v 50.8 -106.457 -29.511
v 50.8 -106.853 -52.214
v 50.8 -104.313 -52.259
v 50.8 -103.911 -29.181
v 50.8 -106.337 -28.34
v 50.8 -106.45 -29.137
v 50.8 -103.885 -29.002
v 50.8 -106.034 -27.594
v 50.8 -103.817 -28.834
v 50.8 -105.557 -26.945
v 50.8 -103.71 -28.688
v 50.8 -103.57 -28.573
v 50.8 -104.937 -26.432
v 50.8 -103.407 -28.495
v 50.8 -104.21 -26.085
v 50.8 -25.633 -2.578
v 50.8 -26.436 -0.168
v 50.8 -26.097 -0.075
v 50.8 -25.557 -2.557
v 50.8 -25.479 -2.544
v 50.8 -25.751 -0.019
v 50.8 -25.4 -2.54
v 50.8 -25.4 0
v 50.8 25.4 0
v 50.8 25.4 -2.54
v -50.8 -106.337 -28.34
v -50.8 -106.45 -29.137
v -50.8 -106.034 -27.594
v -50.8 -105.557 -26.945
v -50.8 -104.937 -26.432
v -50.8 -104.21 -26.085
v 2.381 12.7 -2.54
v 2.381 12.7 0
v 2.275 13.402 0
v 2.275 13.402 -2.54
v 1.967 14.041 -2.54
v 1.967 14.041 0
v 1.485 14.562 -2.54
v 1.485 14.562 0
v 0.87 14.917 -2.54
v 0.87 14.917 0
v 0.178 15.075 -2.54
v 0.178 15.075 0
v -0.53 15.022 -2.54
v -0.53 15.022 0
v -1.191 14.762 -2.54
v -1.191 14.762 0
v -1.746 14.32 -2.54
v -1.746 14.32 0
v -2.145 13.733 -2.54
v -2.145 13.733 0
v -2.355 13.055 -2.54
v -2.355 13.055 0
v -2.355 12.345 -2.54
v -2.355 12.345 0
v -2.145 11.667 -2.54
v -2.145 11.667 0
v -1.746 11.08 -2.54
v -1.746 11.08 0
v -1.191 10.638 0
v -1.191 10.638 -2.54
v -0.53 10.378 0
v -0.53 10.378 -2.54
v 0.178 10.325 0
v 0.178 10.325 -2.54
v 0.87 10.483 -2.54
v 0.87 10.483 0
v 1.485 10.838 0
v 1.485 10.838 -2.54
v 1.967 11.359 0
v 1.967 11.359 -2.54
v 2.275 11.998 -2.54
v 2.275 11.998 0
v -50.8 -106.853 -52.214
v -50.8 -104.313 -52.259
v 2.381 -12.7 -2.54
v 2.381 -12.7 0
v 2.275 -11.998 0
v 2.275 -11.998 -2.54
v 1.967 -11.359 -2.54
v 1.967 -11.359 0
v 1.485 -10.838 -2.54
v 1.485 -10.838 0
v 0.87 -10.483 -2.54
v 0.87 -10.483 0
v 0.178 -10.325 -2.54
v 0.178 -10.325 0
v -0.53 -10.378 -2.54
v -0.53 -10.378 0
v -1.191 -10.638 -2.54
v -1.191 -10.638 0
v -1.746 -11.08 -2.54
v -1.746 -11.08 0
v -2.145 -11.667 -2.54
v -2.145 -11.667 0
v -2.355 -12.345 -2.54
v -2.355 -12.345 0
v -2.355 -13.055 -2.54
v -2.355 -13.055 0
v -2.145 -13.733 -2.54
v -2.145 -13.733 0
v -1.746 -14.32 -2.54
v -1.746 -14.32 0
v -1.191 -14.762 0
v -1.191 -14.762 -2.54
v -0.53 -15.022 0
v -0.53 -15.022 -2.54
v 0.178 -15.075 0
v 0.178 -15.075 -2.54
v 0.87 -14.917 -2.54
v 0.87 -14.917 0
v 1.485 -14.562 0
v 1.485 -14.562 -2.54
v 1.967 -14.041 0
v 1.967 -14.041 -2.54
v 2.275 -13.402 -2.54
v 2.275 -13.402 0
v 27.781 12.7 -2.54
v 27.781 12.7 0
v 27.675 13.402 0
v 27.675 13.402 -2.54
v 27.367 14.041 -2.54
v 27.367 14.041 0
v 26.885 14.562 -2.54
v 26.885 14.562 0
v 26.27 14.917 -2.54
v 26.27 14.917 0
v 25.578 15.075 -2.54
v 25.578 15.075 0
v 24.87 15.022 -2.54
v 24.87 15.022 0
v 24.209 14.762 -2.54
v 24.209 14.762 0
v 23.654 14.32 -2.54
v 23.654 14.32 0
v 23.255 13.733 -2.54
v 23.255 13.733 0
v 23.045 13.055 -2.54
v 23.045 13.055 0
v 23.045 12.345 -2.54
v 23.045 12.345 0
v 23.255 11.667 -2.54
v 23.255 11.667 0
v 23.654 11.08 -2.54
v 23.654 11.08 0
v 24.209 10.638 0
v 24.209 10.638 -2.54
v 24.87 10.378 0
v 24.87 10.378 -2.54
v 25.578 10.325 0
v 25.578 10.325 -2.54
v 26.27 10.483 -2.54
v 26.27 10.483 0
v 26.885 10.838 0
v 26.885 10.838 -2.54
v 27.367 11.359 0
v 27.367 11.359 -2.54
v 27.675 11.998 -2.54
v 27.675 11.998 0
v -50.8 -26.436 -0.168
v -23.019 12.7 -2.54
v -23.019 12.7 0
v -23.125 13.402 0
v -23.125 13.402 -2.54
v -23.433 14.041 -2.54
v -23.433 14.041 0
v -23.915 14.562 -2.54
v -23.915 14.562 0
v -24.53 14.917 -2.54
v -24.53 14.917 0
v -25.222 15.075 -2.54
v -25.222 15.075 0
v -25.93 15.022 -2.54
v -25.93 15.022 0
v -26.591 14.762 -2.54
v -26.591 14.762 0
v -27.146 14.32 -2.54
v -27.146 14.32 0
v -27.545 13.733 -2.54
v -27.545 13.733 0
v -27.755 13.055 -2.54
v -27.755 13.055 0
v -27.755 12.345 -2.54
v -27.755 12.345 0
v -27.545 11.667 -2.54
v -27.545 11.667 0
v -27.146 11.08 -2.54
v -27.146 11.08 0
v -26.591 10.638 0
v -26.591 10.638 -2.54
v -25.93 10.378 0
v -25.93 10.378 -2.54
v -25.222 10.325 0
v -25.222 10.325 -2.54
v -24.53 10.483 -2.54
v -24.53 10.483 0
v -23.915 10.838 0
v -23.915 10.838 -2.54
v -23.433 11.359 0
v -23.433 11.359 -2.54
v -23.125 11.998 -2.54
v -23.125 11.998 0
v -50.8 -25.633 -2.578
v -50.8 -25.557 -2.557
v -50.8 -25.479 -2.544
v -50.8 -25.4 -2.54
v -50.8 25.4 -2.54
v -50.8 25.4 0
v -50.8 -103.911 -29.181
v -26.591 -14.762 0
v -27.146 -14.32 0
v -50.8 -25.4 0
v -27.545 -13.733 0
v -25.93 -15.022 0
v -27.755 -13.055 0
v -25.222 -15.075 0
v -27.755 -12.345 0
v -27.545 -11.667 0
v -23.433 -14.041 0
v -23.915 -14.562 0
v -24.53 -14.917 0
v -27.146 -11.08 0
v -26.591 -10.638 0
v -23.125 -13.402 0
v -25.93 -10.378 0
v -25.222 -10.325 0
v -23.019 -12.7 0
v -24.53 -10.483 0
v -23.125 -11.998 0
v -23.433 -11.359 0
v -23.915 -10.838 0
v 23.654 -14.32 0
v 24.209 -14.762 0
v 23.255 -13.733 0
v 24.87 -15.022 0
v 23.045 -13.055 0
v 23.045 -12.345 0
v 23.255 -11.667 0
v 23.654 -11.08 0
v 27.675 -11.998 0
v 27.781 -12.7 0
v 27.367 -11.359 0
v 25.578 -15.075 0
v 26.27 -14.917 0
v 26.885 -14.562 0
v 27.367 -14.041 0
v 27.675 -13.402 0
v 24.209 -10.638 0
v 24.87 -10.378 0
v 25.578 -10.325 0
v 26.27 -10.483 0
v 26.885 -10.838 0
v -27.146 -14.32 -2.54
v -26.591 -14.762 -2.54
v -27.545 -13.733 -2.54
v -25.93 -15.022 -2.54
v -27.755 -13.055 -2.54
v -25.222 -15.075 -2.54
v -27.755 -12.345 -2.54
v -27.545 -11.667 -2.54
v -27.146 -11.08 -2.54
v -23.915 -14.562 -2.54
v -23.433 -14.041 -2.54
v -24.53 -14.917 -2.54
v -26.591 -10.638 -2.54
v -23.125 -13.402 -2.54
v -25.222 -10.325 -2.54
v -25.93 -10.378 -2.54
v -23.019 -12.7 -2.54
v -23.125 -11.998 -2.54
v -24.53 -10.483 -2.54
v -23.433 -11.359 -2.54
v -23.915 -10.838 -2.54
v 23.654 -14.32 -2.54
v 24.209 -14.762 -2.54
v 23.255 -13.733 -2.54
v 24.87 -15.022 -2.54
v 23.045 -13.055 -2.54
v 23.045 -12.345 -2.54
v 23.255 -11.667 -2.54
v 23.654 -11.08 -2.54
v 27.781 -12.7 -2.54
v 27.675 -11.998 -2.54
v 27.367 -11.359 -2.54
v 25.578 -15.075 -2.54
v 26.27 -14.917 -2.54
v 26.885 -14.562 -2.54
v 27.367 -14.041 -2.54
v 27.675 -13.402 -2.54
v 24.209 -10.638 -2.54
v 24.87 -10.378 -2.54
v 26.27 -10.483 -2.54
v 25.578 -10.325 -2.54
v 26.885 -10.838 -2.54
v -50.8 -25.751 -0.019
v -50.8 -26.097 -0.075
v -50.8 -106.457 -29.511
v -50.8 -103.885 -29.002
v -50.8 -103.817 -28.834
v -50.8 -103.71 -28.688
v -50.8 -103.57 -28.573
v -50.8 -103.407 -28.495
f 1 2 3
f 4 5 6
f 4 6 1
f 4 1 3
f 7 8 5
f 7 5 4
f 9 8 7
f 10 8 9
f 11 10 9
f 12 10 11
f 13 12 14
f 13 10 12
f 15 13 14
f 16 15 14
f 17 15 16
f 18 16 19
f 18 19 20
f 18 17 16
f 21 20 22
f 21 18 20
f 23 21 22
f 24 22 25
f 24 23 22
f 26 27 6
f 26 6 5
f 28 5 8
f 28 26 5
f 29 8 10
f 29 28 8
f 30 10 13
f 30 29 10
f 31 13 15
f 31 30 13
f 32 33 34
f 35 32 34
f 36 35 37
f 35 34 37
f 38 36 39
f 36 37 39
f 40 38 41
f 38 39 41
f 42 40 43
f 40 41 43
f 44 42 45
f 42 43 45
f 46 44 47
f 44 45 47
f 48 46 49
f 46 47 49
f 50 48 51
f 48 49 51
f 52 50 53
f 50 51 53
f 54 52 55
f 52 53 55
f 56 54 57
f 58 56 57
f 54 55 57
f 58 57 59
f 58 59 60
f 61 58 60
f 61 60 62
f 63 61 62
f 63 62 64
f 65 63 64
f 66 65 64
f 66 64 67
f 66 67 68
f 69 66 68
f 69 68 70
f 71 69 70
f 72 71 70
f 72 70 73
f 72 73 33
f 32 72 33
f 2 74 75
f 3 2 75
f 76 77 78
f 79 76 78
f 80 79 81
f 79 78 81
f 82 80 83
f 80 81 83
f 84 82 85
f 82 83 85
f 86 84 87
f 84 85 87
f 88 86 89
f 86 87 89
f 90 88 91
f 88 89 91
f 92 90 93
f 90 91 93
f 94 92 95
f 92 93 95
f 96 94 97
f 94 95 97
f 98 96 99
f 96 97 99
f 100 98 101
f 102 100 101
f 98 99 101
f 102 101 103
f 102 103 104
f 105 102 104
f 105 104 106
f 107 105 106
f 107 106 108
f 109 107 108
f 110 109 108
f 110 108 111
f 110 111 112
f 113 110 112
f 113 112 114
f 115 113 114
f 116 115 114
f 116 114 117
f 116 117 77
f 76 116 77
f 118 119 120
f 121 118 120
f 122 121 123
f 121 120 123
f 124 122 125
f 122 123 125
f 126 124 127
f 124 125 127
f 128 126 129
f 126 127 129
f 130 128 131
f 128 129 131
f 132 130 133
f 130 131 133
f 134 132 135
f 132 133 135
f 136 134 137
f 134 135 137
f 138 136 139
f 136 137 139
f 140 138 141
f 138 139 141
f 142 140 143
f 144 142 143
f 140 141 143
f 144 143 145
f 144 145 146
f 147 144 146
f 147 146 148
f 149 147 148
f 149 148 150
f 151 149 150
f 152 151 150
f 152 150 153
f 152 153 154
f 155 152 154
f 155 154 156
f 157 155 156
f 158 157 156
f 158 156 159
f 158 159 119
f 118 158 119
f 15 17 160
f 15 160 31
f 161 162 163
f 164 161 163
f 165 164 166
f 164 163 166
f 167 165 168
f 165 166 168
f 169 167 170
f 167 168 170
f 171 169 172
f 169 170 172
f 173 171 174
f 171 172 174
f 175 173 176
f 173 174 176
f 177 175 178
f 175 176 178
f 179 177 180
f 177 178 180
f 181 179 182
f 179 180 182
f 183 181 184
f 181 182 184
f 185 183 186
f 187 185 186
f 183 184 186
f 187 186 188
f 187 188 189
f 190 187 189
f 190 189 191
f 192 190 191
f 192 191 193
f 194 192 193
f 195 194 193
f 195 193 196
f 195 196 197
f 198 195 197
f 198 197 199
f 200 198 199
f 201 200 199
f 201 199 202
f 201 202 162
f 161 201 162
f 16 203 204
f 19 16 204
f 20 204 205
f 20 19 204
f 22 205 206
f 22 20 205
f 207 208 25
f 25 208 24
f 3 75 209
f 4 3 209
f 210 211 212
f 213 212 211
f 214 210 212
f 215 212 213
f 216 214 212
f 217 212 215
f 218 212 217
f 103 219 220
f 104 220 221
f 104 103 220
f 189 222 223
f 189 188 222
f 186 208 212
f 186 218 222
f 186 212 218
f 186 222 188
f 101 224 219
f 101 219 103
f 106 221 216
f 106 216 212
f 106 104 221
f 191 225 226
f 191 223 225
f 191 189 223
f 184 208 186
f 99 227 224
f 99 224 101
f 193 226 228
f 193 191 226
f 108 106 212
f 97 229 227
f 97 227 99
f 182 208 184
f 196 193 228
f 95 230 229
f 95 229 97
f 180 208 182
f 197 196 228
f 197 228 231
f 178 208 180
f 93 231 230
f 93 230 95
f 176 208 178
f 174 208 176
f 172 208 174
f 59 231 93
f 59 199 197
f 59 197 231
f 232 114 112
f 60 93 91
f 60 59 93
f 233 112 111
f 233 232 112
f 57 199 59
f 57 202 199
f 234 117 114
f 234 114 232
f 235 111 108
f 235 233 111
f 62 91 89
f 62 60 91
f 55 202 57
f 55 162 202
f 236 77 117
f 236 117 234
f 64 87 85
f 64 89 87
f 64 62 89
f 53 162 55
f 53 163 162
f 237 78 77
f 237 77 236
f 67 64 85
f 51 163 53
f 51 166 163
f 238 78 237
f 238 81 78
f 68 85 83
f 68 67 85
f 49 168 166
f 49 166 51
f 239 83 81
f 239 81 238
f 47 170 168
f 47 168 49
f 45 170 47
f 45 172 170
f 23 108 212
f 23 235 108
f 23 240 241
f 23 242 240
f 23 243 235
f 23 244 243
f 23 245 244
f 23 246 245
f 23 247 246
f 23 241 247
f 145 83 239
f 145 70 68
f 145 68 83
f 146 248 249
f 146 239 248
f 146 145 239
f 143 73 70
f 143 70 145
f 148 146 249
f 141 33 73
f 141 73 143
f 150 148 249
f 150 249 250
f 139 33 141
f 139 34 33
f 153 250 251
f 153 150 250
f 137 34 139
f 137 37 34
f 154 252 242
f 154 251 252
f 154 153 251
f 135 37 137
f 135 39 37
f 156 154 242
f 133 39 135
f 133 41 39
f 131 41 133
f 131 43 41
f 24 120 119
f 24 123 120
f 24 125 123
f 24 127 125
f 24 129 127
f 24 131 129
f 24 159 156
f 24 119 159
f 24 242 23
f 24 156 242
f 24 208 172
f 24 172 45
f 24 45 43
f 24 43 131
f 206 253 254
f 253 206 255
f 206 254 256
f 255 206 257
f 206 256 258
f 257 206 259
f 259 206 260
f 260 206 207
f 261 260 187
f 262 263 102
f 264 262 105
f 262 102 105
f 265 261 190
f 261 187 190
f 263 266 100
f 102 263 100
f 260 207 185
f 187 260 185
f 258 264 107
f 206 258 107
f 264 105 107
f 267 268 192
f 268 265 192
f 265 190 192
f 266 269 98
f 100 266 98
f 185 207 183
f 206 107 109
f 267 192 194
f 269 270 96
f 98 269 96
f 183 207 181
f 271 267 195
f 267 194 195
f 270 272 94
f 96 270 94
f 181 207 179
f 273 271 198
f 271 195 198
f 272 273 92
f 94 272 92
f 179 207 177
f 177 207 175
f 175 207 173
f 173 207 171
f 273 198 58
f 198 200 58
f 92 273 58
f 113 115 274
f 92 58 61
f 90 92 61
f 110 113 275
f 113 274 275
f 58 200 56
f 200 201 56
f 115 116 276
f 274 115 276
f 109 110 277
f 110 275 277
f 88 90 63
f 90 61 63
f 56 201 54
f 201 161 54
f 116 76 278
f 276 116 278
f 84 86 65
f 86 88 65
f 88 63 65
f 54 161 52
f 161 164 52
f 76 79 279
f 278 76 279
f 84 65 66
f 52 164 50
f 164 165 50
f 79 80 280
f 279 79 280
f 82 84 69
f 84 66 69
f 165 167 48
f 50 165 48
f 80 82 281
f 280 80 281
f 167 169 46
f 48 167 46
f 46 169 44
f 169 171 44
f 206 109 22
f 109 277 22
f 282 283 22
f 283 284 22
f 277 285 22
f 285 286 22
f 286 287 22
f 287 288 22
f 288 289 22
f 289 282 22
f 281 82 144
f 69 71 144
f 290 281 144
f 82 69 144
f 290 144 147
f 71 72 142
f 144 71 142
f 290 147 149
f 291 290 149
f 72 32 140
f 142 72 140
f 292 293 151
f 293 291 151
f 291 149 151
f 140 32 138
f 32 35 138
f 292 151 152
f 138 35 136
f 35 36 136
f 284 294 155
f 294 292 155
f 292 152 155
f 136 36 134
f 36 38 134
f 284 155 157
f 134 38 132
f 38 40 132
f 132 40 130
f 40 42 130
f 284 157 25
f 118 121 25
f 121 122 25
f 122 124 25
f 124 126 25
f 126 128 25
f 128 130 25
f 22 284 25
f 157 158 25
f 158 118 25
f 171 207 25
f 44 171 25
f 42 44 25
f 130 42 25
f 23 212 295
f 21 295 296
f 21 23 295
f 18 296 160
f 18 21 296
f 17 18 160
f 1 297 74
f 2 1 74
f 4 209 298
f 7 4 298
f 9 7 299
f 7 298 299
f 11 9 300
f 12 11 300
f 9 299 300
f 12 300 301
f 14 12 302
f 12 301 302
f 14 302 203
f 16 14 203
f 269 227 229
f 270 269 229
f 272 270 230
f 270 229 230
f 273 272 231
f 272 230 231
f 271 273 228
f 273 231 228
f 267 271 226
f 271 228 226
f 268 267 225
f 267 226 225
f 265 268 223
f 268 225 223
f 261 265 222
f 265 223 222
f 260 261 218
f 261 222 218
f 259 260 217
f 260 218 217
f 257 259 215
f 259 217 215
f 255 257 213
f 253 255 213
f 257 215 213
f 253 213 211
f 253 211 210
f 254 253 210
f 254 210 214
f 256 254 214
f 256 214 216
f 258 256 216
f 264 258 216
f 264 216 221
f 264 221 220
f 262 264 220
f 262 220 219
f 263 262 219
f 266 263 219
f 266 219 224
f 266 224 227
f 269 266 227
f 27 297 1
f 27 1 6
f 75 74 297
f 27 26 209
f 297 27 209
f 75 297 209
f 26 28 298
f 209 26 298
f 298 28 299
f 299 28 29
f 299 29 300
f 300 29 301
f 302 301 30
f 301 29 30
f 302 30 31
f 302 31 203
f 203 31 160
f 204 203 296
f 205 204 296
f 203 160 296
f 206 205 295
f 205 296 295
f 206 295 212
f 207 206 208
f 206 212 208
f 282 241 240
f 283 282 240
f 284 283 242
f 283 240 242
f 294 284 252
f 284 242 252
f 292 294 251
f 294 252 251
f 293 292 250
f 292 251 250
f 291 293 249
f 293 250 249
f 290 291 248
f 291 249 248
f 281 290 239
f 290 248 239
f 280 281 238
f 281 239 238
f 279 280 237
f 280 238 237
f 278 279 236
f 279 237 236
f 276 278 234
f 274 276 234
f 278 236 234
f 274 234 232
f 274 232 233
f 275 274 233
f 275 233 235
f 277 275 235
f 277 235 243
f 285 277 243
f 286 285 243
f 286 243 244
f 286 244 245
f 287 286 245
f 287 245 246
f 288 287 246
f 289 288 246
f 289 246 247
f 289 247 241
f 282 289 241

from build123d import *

# Parameters (mm, degrees)
SKETCH1_W            = 101.6
SKETCH1_H            = 50.8
BASE_FLANGE1_DEPTH   = 2.54
EDGE_FLANGE1_DEPTH   = 101.6
EDGE_FLANGE2_START   = -50.8
EDGE_FLANGE2_DEPTH   = 101.6
EDGE_FLANGE2_2_DEPTH = 101.6
SKETCH12_R           = 2.38125
CUT_EXTRUDE1_DEPTH   = 130.341409222


# Read off the part's stored shape, not the designer's step: Edge-Flange2
# Sheet-metal steps are written as plain solids
with BuildPart() as part:
    # Sketch1 → Base-Flange1 (new body)
    with BuildSketch(Plane.XY):
        Rectangle(SKETCH1_W, SKETCH1_H)
    extrude(amount=-BASE_FLANGE1_DEPTH)

    # Edge-Flange1 section (across the edge) → Edge-Flange1 (add)
    with BuildSketch(Plane(origin=(50.8, -25.519501076, -2.54), x_dir=(0, 0.3161458239738, -0.9487106081329159), z_dir=(-1, 0, 0))):
        with BuildLine():
            Line((-2.54, 0.119501076), (-2.54, 85.312927325))
            Line((-2.54, 85.312927325), (0, 85.312927325))
            Line((0, 85.312927325), (0, 0.119501076))
            ThreePointArc((0, 0.119501076), (0.009506284, 0.001542236), (0.037779766, -0.113371938))
            Line((0.037779766, -0.113371938), (-2.371945179, -0.916382331))
            ThreePointArc((-2.371945179, -0.916382331), (-2.497713427, -0.405212383), (-2.54, 0.119501076))
        make_face()
    extrude(amount=EDGE_FLANGE1_DEPTH)

    # Edge-Flange2 outline → Edge-Flange2 (cut)
    with BuildSketch(Plane.YZ.offset(EDGE_FLANGE2_START)):
        with BuildLine():
            Line((-106.45678024, -29.511325705), (-106.45024051, -29.136664838))
            ThreePointArc((-106.45024051, -29.136664838), (-105.815351907, -27.254750412), (-104.210022959, -26.085304214))
            Line((-104.210022959, -26.085304214), (-107.259790633, -27.10160076))
            Line((-107.259790633, -27.10160076), (-106.45678024, -29.511325705))
        make_face()
    extrude(amount=EDGE_FLANGE2_DEPTH, mode=Mode.SUBTRACT)

    # Edge-Flange2 2 outline → Edge-Flange2 2 (add)
    with BuildSketch(Plane.YZ.offset(EDGE_FLANGE2_START)):
        with BuildLine():
            Line((-103.407012566, -28.495029159), (-106.45678024, -29.511325705))
            Line((-106.45678024, -29.511325705), (-106.853065184, -52.214474934))
            Line((-106.853065184, -52.214474934), (-104.313452038, -52.258804046))
            Line((-104.313452038, -52.258804046), (-103.910627364, -29.18099395))
            ThreePointArc((-103.910627364, -29.18099395), (-103.767900469, -28.757927917), (-103.407012566, -28.495029159))
        make_face()
    extrude(amount=EDGE_FLANGE2_2_DEPTH)

    # Sketch12 → Cut-Extrude1 (cut, through all)
    with BuildSketch(Plane.XY):
        with Locations((-25.4, 12.7)):
            Circle(SKETCH12_R)
        with Locations((0, 12.7)):
            Circle(SKETCH12_R)
        with Locations((25.4, 12.7)):
            Circle(SKETCH12_R)
        with Locations((25.4, -12.7)):
            Circle(SKETCH12_R)
        with Locations((0, -12.7)):
            Circle(SKETCH12_R)
        with Locations((-25.4, -12.7)):
            Circle(SKETCH12_R)
    extrude(amount=-CUT_EXTRUDE1_DEPTH, mode=Mode.SUBTRACT)


solid = part.part
